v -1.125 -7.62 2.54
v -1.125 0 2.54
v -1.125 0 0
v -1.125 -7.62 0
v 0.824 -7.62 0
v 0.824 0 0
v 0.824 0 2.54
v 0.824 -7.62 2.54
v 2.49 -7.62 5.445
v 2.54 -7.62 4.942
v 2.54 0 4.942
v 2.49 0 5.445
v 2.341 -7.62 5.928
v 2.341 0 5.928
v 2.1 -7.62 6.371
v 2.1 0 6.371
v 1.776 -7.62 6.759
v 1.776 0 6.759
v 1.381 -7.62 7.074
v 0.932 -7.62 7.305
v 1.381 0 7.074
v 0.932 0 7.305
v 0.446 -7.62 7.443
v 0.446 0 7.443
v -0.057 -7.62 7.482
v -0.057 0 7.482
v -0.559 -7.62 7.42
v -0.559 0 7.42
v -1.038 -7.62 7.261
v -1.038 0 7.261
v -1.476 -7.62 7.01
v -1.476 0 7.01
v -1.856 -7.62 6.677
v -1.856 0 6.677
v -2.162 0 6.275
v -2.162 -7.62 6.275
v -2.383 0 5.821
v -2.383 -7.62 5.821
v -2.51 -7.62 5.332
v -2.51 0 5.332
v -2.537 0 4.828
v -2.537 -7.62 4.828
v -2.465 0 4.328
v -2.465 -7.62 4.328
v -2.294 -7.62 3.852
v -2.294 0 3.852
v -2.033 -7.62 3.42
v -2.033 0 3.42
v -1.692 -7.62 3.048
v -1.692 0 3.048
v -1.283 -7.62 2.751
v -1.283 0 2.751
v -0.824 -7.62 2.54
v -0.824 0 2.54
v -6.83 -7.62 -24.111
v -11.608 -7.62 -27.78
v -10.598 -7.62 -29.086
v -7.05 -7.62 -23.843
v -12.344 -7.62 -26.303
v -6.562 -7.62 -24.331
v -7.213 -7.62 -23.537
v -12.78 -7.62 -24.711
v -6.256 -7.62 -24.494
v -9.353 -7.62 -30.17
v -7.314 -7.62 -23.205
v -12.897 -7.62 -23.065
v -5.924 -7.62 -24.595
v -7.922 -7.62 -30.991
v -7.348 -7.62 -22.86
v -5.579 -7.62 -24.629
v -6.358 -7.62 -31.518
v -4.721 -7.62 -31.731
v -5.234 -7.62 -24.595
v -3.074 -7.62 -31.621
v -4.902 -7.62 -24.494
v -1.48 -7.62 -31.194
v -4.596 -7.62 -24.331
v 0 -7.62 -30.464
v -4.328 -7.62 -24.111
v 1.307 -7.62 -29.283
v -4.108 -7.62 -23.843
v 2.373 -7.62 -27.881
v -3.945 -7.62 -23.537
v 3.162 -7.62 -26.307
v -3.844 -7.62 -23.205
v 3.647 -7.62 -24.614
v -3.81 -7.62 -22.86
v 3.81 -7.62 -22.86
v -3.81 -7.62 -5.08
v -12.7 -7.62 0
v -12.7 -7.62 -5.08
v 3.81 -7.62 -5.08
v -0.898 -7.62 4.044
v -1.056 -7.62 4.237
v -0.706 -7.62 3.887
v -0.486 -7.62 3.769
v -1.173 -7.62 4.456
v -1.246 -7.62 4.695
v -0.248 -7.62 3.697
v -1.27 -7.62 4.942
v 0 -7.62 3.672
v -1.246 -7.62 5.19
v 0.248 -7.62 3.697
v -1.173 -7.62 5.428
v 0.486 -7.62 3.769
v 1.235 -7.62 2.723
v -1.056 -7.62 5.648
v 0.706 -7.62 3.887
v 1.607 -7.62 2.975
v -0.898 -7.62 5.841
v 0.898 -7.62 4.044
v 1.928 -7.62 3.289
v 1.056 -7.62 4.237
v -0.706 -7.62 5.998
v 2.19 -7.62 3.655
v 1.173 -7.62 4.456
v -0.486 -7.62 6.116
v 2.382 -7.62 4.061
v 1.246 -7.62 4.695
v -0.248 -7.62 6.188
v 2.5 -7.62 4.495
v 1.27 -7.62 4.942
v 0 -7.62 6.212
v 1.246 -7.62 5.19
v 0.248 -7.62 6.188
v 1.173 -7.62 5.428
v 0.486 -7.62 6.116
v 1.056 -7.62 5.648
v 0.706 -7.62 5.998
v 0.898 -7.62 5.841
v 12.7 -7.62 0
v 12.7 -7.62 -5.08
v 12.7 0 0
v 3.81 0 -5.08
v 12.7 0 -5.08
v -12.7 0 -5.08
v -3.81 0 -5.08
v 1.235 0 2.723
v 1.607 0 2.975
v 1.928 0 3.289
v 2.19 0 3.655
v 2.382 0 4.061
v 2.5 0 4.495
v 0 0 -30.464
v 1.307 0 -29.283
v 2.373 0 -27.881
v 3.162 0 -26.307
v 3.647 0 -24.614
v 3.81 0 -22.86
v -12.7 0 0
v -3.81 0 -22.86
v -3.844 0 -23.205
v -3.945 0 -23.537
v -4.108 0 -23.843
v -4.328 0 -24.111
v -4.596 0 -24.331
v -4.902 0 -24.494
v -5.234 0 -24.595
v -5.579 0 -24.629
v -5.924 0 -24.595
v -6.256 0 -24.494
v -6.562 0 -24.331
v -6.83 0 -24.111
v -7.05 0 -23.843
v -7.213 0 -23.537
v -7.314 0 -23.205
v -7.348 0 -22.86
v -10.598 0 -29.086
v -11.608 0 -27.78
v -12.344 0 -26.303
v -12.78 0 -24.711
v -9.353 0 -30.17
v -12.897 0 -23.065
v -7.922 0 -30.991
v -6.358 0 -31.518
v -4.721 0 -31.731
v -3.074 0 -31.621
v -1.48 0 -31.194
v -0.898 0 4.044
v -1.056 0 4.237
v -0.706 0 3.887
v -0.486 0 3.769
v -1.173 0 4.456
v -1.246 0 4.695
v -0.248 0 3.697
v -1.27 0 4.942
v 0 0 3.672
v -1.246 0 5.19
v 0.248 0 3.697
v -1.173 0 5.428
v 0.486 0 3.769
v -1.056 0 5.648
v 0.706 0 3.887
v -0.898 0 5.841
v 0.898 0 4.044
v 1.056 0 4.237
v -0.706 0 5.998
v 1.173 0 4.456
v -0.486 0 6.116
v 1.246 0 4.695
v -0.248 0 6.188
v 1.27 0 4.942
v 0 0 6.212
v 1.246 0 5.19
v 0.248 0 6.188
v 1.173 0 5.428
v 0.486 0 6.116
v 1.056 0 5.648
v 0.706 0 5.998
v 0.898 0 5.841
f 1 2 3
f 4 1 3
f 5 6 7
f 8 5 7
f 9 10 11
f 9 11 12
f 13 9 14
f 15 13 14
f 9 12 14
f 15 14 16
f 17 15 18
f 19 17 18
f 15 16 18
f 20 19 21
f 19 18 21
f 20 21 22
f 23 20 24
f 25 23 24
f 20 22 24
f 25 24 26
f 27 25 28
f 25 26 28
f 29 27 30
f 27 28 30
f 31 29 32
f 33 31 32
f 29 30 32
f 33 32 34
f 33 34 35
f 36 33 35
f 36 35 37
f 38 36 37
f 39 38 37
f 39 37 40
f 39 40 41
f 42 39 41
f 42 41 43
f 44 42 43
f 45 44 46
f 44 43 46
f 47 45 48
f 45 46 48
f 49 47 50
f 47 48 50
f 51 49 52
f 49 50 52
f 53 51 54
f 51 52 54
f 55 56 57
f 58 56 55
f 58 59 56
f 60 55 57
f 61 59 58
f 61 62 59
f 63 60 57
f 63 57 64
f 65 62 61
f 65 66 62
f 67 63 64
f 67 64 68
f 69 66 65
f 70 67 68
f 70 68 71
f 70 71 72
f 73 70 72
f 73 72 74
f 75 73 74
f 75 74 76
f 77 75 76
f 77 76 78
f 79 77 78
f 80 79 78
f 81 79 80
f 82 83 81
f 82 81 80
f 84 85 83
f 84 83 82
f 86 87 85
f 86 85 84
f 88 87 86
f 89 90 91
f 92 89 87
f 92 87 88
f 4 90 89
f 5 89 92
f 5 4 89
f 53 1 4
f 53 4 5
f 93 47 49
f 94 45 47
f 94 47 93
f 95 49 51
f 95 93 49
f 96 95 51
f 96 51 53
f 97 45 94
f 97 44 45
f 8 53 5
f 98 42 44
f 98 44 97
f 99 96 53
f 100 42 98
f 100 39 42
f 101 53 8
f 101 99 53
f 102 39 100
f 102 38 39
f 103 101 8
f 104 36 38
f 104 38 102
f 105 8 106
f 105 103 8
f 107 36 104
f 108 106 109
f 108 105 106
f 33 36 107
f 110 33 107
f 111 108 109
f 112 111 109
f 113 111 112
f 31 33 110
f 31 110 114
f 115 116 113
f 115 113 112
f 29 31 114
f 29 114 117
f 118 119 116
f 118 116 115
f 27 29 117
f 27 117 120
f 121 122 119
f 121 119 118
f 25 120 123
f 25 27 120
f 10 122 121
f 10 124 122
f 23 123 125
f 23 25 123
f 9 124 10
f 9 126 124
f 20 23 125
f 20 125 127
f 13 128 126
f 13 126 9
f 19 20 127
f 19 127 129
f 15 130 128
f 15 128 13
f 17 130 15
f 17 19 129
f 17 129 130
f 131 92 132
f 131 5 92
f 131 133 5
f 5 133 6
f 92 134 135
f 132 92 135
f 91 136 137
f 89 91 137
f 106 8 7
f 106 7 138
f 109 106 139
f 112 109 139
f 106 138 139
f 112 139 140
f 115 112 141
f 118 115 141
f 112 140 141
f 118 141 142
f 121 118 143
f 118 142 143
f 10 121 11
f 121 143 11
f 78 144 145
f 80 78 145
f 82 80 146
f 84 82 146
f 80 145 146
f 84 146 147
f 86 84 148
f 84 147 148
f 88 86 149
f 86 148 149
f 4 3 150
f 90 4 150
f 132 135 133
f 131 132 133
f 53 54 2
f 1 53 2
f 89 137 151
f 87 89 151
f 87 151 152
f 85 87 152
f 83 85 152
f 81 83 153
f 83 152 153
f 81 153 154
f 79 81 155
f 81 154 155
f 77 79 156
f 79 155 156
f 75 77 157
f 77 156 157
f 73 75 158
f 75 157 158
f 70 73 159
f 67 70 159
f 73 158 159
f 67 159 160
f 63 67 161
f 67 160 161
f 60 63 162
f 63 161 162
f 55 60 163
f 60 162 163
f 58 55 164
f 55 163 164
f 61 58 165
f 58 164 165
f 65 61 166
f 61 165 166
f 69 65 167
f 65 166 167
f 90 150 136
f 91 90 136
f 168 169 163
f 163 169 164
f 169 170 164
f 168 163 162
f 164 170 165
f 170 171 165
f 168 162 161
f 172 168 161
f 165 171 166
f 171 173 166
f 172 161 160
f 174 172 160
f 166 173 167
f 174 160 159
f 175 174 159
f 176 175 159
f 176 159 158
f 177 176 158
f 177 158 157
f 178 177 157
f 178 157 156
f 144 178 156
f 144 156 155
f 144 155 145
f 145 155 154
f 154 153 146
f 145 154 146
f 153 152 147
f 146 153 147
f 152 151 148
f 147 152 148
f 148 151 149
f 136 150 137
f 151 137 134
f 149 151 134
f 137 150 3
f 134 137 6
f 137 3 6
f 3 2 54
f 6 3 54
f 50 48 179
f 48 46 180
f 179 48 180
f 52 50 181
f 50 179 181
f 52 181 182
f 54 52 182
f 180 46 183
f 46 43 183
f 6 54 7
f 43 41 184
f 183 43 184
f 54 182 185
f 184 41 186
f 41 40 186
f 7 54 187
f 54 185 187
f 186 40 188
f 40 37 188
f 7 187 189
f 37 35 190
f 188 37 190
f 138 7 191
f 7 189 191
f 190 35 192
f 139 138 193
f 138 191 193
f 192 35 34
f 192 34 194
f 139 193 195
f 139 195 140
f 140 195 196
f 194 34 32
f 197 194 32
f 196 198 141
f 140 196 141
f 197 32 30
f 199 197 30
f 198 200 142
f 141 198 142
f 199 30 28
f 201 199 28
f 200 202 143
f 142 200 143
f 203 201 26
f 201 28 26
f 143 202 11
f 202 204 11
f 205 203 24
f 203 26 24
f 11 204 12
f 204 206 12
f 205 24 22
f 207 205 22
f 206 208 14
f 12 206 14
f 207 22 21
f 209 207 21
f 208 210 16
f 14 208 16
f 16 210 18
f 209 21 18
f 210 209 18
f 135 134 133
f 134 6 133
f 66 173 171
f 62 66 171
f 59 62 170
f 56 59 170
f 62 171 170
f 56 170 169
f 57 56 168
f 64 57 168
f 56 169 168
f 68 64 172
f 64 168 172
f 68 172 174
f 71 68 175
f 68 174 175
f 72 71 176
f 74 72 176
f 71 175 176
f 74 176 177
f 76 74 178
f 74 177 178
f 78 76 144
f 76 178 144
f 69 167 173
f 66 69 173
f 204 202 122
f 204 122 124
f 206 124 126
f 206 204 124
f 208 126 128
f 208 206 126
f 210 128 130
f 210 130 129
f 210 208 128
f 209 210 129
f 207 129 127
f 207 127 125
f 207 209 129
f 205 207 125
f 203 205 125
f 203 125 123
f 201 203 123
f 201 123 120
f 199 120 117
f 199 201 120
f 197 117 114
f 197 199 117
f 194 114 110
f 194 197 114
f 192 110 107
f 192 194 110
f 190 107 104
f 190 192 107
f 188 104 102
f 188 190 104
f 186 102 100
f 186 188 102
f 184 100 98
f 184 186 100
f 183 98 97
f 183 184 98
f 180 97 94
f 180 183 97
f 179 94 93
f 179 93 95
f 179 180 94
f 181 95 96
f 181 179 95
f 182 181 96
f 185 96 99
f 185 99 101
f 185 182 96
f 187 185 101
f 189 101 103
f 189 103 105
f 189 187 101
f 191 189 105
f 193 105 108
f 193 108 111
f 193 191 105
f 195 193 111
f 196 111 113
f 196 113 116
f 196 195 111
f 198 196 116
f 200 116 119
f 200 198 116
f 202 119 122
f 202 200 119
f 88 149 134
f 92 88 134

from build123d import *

# Parameters (mm, degrees)
F0_R     = 1.27
F1_DEPTH = 7.62


with BuildPart() as f1:
    # F0 (on Front) → F1 (new body)
    with BuildSketch(Plane.XZ):
        with BuildLine():
            Line((-1.1249838863, 0), (0, 0))
            Line((0, 0), (0.8244126237, 0))
            Line((0.8244126237, 0), (0.8244126237, 2.54))
            ThreePointArc((0.8244126237, 2.54), (0, 2.4024870085), (-0.8244126237, 2.54))
            Line((-0.8244126237, 2.54), (-1.1249838863, 2.54))
            Line((-1.1249838863, 2.54), (-1.1249838863, 0))
        make_face()
        with BuildLine():
            Line((0.8244126237, 0), (0, 0))
            Line((0, 0), (-1.1249838863, 0))
            Line((-1.1249838863, 0), (-12.7, 0))
            Line((-12.7, 0), (-12.7, -5.08))
            Line((-12.7, -5.08), (-3.81, -5.08))
            Line((-3.81, -5.08), (-3.81, -22.86))
            ThreePointArc((-3.81, -22.86), (-5.5788724448, -24.6288724448), (-7.3477448896, -22.86))
            Line((-7.3477448896, -22.86), (-12.896864675, -23.0650249869))
            ThreePointArc((-12.896864675, -23.0650249869), (-8.6576895541, -30.6153855835), (0, -30.4638519883))
            ThreePointArc((0, -30.4638519883), (2.8042172177, -27.1124894197), (3.81, -22.86))
            Line((3.81, -22.86), (3.81, -5.08))
            Line((3.81, -5.08), (12.7, -5.08))
            Line((12.7, -5.08), (12.7, 0))
            Line((12.7, 0), (0.8244126237, 0))
        make_face()
        with BuildLine():
            ThreePointArc((-0.8244126237, 2.54), (0, 2.4024870085), (0.8244126237, 2.54))
            Line((0.8244126237, 2.54), (-0.8244126237, 2.54))
        make_face()
        with BuildLine():
            Line((-0.8244126237, 2.54), (0.8244126237, 2.54))
            ThreePointArc((0.8244126237, 2.54), (2.0670762038, 3.4664124955), (2.54, 4.9424870085))
            ThreePointArc((2.54, 4.9424870085), (-1.476074513, 7.0095632122), (-0.8244126237, 2.54))
        make_face()
        with Locations((0, 4.9424870085)):
            Circle(F0_R, mode=Mode.SUBTRACT)
    extrude(amount=F1_DEPTH)


solid = f1.part
